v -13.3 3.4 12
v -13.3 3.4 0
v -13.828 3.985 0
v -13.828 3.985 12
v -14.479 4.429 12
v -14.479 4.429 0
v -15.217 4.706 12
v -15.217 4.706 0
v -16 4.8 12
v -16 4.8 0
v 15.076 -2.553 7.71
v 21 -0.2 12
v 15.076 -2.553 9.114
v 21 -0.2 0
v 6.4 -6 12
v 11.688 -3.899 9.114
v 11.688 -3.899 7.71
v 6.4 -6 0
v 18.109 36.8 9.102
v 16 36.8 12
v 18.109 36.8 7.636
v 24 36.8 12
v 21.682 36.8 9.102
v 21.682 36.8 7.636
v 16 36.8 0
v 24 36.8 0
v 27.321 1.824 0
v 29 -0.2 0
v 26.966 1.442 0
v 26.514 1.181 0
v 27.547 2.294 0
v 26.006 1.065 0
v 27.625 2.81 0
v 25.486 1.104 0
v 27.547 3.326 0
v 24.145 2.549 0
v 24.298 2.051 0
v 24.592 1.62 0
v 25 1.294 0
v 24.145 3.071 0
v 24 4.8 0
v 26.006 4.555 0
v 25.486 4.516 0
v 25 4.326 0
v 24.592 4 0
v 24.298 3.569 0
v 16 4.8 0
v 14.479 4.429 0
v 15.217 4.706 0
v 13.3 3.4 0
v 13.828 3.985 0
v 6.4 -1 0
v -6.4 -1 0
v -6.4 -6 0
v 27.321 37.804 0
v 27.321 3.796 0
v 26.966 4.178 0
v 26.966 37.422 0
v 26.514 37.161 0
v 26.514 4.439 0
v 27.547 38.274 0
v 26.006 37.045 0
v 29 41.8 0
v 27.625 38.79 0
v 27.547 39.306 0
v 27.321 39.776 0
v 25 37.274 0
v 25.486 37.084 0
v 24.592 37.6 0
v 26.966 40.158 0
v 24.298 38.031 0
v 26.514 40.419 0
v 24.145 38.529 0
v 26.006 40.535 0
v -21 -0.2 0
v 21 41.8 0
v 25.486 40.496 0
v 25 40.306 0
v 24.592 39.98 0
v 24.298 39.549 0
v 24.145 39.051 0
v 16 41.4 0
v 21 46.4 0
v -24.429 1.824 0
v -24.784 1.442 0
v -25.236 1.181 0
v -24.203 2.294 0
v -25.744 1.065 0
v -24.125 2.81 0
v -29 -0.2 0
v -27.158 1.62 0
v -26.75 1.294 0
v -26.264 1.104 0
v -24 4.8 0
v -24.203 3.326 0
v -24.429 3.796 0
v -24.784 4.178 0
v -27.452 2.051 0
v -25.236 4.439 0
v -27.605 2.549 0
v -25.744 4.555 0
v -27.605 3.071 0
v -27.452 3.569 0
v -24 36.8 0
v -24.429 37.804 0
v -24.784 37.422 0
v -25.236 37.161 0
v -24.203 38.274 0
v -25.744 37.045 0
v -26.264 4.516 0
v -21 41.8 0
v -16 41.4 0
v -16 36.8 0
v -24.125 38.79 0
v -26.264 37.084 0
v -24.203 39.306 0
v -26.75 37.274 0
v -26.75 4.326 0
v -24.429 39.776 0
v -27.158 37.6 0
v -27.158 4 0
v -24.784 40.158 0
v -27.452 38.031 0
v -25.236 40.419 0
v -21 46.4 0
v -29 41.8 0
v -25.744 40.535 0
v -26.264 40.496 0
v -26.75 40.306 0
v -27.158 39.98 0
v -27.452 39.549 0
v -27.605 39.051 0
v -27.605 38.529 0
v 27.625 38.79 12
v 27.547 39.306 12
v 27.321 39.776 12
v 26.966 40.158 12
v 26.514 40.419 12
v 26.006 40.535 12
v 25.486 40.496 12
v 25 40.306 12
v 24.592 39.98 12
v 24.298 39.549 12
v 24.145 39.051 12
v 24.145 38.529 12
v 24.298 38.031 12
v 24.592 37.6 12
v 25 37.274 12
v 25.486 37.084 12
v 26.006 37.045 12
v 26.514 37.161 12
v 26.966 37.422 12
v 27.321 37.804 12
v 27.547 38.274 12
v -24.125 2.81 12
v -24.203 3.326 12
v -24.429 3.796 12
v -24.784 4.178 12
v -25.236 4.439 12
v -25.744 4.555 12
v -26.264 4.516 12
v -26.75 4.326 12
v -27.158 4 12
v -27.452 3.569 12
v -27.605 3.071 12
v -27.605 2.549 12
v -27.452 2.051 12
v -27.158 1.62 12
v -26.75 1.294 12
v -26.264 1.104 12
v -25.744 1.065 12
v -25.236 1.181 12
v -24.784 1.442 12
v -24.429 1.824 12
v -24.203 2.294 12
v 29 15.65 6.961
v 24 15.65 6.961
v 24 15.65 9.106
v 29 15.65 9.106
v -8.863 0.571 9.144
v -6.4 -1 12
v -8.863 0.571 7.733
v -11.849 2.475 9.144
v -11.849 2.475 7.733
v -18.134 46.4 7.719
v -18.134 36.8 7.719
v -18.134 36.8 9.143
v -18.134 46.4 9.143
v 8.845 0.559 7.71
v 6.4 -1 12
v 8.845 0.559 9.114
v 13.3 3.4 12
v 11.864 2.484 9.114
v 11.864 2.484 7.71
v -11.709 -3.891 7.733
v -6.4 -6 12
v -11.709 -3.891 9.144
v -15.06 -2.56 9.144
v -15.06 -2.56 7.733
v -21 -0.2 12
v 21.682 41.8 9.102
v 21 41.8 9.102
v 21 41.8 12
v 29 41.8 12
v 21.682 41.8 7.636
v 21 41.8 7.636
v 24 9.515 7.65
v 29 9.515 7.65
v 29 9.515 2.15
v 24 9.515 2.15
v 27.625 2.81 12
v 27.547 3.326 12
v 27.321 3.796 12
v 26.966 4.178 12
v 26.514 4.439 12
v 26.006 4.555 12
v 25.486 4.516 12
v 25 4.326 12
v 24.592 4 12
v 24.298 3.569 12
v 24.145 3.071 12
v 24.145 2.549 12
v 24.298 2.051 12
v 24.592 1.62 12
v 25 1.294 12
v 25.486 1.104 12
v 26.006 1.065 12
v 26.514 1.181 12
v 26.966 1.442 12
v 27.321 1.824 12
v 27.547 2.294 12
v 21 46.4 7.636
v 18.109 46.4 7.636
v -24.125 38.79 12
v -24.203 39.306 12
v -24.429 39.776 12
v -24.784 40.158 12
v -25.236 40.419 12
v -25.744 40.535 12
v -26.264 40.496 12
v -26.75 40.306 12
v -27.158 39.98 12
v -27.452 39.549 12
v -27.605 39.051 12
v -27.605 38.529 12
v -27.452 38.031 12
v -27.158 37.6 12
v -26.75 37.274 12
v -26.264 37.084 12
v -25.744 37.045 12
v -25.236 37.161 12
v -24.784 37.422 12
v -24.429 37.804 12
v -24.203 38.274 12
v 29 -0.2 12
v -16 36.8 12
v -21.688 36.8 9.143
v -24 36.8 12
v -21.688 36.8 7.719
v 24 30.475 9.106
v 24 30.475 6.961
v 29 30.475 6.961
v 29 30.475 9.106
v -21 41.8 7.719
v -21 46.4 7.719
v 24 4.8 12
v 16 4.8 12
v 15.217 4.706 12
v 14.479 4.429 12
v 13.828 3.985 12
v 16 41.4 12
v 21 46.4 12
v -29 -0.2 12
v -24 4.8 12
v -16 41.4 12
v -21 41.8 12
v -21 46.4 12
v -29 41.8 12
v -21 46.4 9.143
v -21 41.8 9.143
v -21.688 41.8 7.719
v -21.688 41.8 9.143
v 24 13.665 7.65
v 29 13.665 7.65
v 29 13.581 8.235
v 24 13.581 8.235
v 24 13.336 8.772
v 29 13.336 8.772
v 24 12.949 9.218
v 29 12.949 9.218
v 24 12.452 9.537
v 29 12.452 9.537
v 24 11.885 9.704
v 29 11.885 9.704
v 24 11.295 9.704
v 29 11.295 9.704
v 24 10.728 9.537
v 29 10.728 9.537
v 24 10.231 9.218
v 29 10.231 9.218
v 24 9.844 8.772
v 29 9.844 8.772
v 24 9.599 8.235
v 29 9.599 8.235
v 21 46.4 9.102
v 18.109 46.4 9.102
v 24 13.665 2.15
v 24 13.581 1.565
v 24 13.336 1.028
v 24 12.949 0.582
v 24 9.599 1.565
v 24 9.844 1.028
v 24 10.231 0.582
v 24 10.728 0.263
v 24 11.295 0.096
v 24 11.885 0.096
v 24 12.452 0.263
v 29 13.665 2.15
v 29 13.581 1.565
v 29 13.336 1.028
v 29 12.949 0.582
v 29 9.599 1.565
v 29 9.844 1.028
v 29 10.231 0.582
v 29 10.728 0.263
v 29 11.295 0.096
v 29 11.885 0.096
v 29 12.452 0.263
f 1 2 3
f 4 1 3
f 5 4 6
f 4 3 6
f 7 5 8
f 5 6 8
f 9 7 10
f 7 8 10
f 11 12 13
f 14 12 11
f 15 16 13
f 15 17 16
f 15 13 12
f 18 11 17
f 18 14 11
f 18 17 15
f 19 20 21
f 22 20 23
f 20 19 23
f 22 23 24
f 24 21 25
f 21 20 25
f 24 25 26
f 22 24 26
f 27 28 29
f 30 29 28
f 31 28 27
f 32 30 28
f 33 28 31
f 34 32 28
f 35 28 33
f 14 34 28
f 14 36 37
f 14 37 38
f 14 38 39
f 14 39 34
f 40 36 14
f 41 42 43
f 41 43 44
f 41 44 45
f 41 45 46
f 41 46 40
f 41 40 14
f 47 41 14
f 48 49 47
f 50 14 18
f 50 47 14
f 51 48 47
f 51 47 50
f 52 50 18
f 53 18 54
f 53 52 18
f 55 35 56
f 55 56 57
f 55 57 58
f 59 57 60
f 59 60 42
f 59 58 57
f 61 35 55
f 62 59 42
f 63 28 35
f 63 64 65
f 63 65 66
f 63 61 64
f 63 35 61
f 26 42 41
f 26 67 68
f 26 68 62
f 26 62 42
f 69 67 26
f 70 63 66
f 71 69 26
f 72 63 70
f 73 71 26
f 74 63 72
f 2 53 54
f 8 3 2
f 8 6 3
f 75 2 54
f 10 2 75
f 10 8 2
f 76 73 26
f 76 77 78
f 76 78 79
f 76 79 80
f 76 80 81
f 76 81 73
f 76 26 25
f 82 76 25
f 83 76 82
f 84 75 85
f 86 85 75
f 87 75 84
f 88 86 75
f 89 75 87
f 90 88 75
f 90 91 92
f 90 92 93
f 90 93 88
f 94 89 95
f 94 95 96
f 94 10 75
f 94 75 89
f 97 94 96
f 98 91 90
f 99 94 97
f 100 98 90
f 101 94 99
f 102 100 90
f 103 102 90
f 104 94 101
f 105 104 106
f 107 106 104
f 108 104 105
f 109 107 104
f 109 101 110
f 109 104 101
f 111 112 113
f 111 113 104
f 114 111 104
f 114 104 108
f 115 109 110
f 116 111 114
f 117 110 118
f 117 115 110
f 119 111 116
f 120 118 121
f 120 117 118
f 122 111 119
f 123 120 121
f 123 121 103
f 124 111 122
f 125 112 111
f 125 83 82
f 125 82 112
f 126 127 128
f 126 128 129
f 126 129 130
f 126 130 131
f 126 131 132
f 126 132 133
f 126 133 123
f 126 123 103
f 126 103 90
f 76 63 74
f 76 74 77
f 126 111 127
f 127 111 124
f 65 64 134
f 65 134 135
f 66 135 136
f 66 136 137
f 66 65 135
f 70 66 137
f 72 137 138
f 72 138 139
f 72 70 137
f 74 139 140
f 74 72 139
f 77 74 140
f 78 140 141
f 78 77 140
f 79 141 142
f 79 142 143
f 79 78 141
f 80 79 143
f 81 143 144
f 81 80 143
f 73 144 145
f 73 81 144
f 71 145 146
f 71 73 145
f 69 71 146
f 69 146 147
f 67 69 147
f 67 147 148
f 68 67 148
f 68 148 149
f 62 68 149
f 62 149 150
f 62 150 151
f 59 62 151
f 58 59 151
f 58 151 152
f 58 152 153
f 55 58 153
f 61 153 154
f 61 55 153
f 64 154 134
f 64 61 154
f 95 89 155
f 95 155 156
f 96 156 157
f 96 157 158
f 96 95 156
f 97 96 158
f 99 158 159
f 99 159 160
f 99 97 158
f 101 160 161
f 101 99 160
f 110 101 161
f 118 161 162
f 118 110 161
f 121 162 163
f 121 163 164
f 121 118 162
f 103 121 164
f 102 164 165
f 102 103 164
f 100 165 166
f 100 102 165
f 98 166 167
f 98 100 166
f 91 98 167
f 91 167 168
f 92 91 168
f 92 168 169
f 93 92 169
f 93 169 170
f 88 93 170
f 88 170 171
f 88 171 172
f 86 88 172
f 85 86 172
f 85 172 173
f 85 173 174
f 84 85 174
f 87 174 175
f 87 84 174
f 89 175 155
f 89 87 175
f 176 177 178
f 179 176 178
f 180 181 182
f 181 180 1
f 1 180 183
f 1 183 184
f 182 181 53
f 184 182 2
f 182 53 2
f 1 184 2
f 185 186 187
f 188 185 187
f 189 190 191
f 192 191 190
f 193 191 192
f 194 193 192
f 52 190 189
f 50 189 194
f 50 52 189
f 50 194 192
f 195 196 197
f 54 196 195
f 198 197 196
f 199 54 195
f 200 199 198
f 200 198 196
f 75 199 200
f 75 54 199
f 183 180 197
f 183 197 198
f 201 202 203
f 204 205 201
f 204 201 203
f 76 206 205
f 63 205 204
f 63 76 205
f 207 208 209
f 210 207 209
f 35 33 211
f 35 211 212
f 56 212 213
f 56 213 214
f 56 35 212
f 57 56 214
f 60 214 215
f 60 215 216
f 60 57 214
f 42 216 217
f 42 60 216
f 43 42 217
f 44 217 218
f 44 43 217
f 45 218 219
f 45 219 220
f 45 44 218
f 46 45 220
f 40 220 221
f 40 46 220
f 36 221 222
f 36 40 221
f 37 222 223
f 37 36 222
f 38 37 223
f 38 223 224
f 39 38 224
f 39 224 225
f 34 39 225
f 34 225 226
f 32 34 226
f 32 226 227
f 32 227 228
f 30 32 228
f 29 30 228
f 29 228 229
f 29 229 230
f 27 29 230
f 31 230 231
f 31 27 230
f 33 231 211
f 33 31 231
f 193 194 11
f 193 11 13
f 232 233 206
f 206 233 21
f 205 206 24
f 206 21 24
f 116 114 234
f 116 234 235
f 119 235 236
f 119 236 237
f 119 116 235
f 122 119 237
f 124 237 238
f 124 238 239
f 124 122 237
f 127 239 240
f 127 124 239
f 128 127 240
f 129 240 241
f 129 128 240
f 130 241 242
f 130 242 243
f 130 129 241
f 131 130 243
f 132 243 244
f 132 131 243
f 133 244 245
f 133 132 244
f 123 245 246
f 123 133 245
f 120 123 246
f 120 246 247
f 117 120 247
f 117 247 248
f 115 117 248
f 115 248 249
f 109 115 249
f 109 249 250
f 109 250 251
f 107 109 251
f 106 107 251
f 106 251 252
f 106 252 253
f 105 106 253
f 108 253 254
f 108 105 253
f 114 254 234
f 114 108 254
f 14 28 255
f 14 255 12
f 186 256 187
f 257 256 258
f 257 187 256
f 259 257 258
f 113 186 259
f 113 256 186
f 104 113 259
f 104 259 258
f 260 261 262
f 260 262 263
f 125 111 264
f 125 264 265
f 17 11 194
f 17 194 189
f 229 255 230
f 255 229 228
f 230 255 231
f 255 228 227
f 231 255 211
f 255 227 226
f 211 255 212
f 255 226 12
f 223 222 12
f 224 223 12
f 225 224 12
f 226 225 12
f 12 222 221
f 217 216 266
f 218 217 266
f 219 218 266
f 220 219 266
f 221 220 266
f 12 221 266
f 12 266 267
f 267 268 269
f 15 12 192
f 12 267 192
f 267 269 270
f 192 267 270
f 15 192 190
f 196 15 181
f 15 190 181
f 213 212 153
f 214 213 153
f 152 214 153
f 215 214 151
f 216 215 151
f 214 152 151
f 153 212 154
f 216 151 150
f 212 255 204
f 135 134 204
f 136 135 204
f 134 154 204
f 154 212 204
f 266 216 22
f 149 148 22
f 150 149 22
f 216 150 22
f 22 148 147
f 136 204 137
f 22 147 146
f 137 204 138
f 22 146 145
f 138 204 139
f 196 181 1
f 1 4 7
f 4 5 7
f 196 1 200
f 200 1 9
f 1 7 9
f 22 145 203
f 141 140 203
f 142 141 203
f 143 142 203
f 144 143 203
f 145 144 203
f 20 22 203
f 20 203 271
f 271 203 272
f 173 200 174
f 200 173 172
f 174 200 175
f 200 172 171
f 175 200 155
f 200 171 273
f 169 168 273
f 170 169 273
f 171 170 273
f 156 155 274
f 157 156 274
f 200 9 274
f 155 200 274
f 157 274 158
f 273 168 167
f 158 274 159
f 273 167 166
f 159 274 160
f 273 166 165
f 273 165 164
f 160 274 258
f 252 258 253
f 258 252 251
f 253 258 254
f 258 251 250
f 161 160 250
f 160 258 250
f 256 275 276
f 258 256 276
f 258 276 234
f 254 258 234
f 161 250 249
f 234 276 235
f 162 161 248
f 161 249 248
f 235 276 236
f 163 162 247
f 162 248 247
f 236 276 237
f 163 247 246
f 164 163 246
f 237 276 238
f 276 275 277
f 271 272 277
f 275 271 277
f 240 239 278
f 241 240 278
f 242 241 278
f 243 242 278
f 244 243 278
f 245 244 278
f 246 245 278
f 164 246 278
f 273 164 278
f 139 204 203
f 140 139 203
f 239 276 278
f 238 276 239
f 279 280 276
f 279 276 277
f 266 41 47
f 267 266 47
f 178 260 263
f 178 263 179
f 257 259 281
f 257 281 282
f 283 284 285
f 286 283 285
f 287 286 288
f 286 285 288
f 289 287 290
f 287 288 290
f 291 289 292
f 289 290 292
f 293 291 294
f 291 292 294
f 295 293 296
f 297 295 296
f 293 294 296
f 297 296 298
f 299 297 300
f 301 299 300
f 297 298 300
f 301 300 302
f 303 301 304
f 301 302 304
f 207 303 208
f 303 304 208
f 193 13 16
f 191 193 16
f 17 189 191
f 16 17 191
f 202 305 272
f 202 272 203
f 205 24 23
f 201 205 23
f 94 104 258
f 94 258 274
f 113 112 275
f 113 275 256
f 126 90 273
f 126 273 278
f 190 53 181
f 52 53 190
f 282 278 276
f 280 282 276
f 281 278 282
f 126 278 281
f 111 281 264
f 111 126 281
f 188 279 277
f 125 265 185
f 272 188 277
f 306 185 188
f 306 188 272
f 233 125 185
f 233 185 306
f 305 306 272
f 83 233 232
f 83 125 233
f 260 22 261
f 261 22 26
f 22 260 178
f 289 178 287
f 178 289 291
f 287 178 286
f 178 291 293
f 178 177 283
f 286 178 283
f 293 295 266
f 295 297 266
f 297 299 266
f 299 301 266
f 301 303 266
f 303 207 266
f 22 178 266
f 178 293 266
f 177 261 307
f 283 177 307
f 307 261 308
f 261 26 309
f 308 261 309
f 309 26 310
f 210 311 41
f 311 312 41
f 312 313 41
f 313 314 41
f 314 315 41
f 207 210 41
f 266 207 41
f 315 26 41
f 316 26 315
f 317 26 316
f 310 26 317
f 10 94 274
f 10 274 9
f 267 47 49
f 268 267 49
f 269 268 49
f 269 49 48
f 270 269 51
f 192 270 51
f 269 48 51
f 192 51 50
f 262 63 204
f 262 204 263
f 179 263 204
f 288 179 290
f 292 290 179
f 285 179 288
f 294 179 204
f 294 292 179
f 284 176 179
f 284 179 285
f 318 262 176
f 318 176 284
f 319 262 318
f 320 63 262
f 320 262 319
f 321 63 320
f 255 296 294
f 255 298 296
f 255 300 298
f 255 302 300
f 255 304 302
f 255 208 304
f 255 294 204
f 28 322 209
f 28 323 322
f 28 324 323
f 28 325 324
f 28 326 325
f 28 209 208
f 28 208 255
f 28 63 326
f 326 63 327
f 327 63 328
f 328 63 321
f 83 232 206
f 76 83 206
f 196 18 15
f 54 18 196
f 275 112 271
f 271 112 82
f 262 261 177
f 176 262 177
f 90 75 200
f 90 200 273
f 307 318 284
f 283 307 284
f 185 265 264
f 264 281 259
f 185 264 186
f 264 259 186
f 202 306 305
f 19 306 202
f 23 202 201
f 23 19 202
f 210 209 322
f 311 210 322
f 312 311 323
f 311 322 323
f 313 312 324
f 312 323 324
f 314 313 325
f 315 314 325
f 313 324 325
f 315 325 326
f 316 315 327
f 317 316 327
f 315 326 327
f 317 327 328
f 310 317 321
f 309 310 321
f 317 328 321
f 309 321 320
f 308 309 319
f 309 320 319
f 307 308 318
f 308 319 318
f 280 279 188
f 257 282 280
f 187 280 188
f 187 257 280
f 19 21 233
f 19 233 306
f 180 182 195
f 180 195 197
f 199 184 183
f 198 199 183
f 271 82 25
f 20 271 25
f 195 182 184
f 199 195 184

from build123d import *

# Parameters (mm, degrees)
SKETCH007_W                               = 14.824166
SKETCH007_H                               = 2.145144
EXTRUDE007_DEPTH                          = 7
SKETCH006_W                               = 3.554402
SKETCH006_H                               = 1.424327
EXTRUDE006_DEPTH                          = 10
SKETCH004_AS_DRAWN_W                      = 3.541569
SKETCH004_AS_DRAWN_H                      = 1.411495
EXTRUDE005_DEPTH                          = 7
EXTRUDE005_ONTO_SKETCH004_ROLL_ANGLE      = 90
EXTRUDE005_ONTO_SKETCH004_PLACEMENT_ANGLE = 147.47511
SKETCH005_W                               = 3.573389
SKETCH005_H                               = 1.465404
EXTRUDE004_DEPTH                          = 10
SKETCH003_AS_DRAWN_W                      = 3.579881
SKETCH003_AS_DRAWN_H                      = 1.40319
EXTRUDE003_DEPTH                          = 7
EXTRUDE003_ONTO_SKETCH003_ROLL_ANGLE      = 90
EXTRUDE003_ONTO_SKETCH003_PLACEMENT_ANGLE = -147.47511
EXTRUDE002_DEPTH                          = 5
SKETCH_R                                  = 1.75
EXTRUDE_DEPTH                             = 12


with BuildPart() as extrude007:
    # Sketch007 (on Face32 of Cut004) → Extrude007 (new body)
    with BuildSketch(Plane(origin=(24, 0, 0), x_dir=(0, -1, 0), z_dir=(-1, 0, 0))):
        with Locations((-23.062542, 8.033458)):
            Rectangle(SKETCH007_W, SKETCH007_H)
    extrude(amount=-EXTRUDE007_DEPTH)


with BuildPart() as extrude006:
    # Sketch006 (on Face23 of Cut002) → Extrude006 (new body)
    with BuildSketch(Plane.XZ.offset(-36.8)):
        with Locations((-19.910848, 8.431245)):
            Rectangle(SKETCH006_W, SKETCH006_H)
    extrude(amount=-EXTRUDE006_DEPTH)


with BuildPart() as extrude005:
    # Sketch004 as drawn → Extrude005 (new)
    with BuildSketch(Plane.XY):
        with Locations((9.550918, 8.438737)):
            Rectangle(SKETCH004_AS_DRAWN_W, SKETCH004_AS_DRAWN_H)
    extrude(amount=-EXTRUDE005_DEPTH)


with BuildPart() as extrude005_1:
    # Extrude005 onto Sketch004 roll: moved
    add(extrude005.part.rotate(Axis((0, 0, 0), (1, 0, 0)), EXTRUDE005_ONTO_SKETCH004_ROLL_ANGLE))


with BuildPart() as extrude005_2:
    # Extrude005 onto Sketch004 placement: moved
    add(extrude005_1.part.moved(Location((-2.303479, -3.612274, 0))).rotate(Axis((-2.303479, -3.612274, 0), (0, 0, 1)), EXTRUDE005_ONTO_SKETCH004_PLACEMENT_ANGLE))


with BuildPart() as extrude004:
    # Sketch005 (on Face23 of Cut001) → Extrude004 (new body)
    with BuildSketch(Plane.XZ.offset(-36.8)):
        with Locations((19.895352, 8.368902)):
            Rectangle(SKETCH005_W, SKETCH005_H)
    extrude(amount=-EXTRUDE004_DEPTH)


with BuildPart() as extrude003:
    # Sketch003 as drawn → Extrude003 (new)
    with BuildSketch(Plane.XY):
        with Locations((-9.548731, 8.412013)):
            Rectangle(SKETCH003_AS_DRAWN_W, SKETCH003_AS_DRAWN_H)
    extrude(amount=-EXTRUDE003_DEPTH)


with BuildPart() as extrude003_1:
    # Extrude003 onto Sketch003 roll: moved
    add(extrude003.part.rotate(Axis((0, 0, 0), (1, 0, 0)), EXTRUDE003_ONTO_SKETCH003_ROLL_ANGLE))


with BuildPart() as extrude003_2:
    # Extrude003 onto Sketch003 placement: moved
    add(extrude003_1.part.moved(Location((2.303479, -3.612274, 0))).rotate(Axis((2.303479, -3.612274, 0), (0, 0, 1)), EXTRUDE003_ONTO_SKETCH003_PLACEMENT_ANGLE))


with BuildPart() as extrude002:
    # Sketch002 (on Face4 of Extrude) → Extrude002 (new body)
    with BuildSketch(Plane.YZ.offset(29)):
        with BuildLine():
            ThreePointArc((13.665, 7.65), (11.59, 9.725), (9.515, 7.65))
            Line((9.515, 7.65), (9.515, 2.15))
            ThreePointArc((9.515, 2.15), (11.59, 0.075), (13.665, 2.15))
            Line((13.665, 2.15), (13.665, 7.65))
        make_face()
    extrude(amount=-EXTRUDE002_DEPTH)


with BuildPart() as cut005:
    # Sketch → Extrude (new body)
    with BuildSketch(Plane.XY):
        Polygon((-21, 46.4), (21, 46.4), (21, 41.8), (29, 41.8), (29, -0.2), (21, -0.2), (6.4, -6), (-6.4, -6), (-21, -0.2), (-29, -0.2), (-29, 41.8), (-21, 41.8), align=None)
        with Locations((-25.875, 38.79)):
            Circle(SKETCH_R, mode=Mode.SUBTRACT)
        with Locations((25.875, 38.79)):
            Circle(SKETCH_R, mode=Mode.SUBTRACT)
        with Locations((25.875, 2.81)):
            Circle(SKETCH_R, mode=Mode.SUBTRACT)
        with Locations((-25.875, 2.81)):
            Circle(SKETCH_R, mode=Mode.SUBTRACT)
        with BuildLine():
            Line((-16, 41.4), (16, 41.4))
            Line((16, 41.4), (16, 36.8))
            Line((16, 36.8), (24, 36.8))
            Line((24, 36.8), (24, 4.8))
            Line((24, 4.8), (16, 4.8))
            ThreePointArc((16, 4.8), (14.479309, 4.429189), (13.3, 3.4))
            Line((6.4, -1), (13.3, 3.4))
            Line((-6.4, -1), (6.4, -1))
            Line((-6.4, -1), (-13.3, 3.4))
            ThreePointArc((-13.3, 3.4), (-14.479309, 4.429189), (-16, 4.8))
            Line((-24, 4.8), (-16, 4.8))
            Line((-24, 36.8), (-24, 4.8))
            Line((-16, 36.8), (-24, 36.8))
            Line((-16, 41.4), (-16, 36.8))
        make_face(mode=Mode.SUBTRACT)
    extrude(amount=EXTRUDE_DEPTH)

    # Cut: cut Extrude002
    add(extrude002.part, mode=Mode.SUBTRACT)

    # Cut001: cut Extrude003
    add(extrude003_2.part, mode=Mode.SUBTRACT)

    # Cut002: cut Extrude004
    add(extrude004.part, mode=Mode.SUBTRACT)

    # Cut003: cut Extrude005
    add(extrude005_2.part, mode=Mode.SUBTRACT)

    # Cut004: cut Extrude006
    add(extrude006.part, mode=Mode.SUBTRACT)

    # Cut005: cut Extrude007
    add(extrude007.part, mode=Mode.SUBTRACT)


solid = cut005.part
